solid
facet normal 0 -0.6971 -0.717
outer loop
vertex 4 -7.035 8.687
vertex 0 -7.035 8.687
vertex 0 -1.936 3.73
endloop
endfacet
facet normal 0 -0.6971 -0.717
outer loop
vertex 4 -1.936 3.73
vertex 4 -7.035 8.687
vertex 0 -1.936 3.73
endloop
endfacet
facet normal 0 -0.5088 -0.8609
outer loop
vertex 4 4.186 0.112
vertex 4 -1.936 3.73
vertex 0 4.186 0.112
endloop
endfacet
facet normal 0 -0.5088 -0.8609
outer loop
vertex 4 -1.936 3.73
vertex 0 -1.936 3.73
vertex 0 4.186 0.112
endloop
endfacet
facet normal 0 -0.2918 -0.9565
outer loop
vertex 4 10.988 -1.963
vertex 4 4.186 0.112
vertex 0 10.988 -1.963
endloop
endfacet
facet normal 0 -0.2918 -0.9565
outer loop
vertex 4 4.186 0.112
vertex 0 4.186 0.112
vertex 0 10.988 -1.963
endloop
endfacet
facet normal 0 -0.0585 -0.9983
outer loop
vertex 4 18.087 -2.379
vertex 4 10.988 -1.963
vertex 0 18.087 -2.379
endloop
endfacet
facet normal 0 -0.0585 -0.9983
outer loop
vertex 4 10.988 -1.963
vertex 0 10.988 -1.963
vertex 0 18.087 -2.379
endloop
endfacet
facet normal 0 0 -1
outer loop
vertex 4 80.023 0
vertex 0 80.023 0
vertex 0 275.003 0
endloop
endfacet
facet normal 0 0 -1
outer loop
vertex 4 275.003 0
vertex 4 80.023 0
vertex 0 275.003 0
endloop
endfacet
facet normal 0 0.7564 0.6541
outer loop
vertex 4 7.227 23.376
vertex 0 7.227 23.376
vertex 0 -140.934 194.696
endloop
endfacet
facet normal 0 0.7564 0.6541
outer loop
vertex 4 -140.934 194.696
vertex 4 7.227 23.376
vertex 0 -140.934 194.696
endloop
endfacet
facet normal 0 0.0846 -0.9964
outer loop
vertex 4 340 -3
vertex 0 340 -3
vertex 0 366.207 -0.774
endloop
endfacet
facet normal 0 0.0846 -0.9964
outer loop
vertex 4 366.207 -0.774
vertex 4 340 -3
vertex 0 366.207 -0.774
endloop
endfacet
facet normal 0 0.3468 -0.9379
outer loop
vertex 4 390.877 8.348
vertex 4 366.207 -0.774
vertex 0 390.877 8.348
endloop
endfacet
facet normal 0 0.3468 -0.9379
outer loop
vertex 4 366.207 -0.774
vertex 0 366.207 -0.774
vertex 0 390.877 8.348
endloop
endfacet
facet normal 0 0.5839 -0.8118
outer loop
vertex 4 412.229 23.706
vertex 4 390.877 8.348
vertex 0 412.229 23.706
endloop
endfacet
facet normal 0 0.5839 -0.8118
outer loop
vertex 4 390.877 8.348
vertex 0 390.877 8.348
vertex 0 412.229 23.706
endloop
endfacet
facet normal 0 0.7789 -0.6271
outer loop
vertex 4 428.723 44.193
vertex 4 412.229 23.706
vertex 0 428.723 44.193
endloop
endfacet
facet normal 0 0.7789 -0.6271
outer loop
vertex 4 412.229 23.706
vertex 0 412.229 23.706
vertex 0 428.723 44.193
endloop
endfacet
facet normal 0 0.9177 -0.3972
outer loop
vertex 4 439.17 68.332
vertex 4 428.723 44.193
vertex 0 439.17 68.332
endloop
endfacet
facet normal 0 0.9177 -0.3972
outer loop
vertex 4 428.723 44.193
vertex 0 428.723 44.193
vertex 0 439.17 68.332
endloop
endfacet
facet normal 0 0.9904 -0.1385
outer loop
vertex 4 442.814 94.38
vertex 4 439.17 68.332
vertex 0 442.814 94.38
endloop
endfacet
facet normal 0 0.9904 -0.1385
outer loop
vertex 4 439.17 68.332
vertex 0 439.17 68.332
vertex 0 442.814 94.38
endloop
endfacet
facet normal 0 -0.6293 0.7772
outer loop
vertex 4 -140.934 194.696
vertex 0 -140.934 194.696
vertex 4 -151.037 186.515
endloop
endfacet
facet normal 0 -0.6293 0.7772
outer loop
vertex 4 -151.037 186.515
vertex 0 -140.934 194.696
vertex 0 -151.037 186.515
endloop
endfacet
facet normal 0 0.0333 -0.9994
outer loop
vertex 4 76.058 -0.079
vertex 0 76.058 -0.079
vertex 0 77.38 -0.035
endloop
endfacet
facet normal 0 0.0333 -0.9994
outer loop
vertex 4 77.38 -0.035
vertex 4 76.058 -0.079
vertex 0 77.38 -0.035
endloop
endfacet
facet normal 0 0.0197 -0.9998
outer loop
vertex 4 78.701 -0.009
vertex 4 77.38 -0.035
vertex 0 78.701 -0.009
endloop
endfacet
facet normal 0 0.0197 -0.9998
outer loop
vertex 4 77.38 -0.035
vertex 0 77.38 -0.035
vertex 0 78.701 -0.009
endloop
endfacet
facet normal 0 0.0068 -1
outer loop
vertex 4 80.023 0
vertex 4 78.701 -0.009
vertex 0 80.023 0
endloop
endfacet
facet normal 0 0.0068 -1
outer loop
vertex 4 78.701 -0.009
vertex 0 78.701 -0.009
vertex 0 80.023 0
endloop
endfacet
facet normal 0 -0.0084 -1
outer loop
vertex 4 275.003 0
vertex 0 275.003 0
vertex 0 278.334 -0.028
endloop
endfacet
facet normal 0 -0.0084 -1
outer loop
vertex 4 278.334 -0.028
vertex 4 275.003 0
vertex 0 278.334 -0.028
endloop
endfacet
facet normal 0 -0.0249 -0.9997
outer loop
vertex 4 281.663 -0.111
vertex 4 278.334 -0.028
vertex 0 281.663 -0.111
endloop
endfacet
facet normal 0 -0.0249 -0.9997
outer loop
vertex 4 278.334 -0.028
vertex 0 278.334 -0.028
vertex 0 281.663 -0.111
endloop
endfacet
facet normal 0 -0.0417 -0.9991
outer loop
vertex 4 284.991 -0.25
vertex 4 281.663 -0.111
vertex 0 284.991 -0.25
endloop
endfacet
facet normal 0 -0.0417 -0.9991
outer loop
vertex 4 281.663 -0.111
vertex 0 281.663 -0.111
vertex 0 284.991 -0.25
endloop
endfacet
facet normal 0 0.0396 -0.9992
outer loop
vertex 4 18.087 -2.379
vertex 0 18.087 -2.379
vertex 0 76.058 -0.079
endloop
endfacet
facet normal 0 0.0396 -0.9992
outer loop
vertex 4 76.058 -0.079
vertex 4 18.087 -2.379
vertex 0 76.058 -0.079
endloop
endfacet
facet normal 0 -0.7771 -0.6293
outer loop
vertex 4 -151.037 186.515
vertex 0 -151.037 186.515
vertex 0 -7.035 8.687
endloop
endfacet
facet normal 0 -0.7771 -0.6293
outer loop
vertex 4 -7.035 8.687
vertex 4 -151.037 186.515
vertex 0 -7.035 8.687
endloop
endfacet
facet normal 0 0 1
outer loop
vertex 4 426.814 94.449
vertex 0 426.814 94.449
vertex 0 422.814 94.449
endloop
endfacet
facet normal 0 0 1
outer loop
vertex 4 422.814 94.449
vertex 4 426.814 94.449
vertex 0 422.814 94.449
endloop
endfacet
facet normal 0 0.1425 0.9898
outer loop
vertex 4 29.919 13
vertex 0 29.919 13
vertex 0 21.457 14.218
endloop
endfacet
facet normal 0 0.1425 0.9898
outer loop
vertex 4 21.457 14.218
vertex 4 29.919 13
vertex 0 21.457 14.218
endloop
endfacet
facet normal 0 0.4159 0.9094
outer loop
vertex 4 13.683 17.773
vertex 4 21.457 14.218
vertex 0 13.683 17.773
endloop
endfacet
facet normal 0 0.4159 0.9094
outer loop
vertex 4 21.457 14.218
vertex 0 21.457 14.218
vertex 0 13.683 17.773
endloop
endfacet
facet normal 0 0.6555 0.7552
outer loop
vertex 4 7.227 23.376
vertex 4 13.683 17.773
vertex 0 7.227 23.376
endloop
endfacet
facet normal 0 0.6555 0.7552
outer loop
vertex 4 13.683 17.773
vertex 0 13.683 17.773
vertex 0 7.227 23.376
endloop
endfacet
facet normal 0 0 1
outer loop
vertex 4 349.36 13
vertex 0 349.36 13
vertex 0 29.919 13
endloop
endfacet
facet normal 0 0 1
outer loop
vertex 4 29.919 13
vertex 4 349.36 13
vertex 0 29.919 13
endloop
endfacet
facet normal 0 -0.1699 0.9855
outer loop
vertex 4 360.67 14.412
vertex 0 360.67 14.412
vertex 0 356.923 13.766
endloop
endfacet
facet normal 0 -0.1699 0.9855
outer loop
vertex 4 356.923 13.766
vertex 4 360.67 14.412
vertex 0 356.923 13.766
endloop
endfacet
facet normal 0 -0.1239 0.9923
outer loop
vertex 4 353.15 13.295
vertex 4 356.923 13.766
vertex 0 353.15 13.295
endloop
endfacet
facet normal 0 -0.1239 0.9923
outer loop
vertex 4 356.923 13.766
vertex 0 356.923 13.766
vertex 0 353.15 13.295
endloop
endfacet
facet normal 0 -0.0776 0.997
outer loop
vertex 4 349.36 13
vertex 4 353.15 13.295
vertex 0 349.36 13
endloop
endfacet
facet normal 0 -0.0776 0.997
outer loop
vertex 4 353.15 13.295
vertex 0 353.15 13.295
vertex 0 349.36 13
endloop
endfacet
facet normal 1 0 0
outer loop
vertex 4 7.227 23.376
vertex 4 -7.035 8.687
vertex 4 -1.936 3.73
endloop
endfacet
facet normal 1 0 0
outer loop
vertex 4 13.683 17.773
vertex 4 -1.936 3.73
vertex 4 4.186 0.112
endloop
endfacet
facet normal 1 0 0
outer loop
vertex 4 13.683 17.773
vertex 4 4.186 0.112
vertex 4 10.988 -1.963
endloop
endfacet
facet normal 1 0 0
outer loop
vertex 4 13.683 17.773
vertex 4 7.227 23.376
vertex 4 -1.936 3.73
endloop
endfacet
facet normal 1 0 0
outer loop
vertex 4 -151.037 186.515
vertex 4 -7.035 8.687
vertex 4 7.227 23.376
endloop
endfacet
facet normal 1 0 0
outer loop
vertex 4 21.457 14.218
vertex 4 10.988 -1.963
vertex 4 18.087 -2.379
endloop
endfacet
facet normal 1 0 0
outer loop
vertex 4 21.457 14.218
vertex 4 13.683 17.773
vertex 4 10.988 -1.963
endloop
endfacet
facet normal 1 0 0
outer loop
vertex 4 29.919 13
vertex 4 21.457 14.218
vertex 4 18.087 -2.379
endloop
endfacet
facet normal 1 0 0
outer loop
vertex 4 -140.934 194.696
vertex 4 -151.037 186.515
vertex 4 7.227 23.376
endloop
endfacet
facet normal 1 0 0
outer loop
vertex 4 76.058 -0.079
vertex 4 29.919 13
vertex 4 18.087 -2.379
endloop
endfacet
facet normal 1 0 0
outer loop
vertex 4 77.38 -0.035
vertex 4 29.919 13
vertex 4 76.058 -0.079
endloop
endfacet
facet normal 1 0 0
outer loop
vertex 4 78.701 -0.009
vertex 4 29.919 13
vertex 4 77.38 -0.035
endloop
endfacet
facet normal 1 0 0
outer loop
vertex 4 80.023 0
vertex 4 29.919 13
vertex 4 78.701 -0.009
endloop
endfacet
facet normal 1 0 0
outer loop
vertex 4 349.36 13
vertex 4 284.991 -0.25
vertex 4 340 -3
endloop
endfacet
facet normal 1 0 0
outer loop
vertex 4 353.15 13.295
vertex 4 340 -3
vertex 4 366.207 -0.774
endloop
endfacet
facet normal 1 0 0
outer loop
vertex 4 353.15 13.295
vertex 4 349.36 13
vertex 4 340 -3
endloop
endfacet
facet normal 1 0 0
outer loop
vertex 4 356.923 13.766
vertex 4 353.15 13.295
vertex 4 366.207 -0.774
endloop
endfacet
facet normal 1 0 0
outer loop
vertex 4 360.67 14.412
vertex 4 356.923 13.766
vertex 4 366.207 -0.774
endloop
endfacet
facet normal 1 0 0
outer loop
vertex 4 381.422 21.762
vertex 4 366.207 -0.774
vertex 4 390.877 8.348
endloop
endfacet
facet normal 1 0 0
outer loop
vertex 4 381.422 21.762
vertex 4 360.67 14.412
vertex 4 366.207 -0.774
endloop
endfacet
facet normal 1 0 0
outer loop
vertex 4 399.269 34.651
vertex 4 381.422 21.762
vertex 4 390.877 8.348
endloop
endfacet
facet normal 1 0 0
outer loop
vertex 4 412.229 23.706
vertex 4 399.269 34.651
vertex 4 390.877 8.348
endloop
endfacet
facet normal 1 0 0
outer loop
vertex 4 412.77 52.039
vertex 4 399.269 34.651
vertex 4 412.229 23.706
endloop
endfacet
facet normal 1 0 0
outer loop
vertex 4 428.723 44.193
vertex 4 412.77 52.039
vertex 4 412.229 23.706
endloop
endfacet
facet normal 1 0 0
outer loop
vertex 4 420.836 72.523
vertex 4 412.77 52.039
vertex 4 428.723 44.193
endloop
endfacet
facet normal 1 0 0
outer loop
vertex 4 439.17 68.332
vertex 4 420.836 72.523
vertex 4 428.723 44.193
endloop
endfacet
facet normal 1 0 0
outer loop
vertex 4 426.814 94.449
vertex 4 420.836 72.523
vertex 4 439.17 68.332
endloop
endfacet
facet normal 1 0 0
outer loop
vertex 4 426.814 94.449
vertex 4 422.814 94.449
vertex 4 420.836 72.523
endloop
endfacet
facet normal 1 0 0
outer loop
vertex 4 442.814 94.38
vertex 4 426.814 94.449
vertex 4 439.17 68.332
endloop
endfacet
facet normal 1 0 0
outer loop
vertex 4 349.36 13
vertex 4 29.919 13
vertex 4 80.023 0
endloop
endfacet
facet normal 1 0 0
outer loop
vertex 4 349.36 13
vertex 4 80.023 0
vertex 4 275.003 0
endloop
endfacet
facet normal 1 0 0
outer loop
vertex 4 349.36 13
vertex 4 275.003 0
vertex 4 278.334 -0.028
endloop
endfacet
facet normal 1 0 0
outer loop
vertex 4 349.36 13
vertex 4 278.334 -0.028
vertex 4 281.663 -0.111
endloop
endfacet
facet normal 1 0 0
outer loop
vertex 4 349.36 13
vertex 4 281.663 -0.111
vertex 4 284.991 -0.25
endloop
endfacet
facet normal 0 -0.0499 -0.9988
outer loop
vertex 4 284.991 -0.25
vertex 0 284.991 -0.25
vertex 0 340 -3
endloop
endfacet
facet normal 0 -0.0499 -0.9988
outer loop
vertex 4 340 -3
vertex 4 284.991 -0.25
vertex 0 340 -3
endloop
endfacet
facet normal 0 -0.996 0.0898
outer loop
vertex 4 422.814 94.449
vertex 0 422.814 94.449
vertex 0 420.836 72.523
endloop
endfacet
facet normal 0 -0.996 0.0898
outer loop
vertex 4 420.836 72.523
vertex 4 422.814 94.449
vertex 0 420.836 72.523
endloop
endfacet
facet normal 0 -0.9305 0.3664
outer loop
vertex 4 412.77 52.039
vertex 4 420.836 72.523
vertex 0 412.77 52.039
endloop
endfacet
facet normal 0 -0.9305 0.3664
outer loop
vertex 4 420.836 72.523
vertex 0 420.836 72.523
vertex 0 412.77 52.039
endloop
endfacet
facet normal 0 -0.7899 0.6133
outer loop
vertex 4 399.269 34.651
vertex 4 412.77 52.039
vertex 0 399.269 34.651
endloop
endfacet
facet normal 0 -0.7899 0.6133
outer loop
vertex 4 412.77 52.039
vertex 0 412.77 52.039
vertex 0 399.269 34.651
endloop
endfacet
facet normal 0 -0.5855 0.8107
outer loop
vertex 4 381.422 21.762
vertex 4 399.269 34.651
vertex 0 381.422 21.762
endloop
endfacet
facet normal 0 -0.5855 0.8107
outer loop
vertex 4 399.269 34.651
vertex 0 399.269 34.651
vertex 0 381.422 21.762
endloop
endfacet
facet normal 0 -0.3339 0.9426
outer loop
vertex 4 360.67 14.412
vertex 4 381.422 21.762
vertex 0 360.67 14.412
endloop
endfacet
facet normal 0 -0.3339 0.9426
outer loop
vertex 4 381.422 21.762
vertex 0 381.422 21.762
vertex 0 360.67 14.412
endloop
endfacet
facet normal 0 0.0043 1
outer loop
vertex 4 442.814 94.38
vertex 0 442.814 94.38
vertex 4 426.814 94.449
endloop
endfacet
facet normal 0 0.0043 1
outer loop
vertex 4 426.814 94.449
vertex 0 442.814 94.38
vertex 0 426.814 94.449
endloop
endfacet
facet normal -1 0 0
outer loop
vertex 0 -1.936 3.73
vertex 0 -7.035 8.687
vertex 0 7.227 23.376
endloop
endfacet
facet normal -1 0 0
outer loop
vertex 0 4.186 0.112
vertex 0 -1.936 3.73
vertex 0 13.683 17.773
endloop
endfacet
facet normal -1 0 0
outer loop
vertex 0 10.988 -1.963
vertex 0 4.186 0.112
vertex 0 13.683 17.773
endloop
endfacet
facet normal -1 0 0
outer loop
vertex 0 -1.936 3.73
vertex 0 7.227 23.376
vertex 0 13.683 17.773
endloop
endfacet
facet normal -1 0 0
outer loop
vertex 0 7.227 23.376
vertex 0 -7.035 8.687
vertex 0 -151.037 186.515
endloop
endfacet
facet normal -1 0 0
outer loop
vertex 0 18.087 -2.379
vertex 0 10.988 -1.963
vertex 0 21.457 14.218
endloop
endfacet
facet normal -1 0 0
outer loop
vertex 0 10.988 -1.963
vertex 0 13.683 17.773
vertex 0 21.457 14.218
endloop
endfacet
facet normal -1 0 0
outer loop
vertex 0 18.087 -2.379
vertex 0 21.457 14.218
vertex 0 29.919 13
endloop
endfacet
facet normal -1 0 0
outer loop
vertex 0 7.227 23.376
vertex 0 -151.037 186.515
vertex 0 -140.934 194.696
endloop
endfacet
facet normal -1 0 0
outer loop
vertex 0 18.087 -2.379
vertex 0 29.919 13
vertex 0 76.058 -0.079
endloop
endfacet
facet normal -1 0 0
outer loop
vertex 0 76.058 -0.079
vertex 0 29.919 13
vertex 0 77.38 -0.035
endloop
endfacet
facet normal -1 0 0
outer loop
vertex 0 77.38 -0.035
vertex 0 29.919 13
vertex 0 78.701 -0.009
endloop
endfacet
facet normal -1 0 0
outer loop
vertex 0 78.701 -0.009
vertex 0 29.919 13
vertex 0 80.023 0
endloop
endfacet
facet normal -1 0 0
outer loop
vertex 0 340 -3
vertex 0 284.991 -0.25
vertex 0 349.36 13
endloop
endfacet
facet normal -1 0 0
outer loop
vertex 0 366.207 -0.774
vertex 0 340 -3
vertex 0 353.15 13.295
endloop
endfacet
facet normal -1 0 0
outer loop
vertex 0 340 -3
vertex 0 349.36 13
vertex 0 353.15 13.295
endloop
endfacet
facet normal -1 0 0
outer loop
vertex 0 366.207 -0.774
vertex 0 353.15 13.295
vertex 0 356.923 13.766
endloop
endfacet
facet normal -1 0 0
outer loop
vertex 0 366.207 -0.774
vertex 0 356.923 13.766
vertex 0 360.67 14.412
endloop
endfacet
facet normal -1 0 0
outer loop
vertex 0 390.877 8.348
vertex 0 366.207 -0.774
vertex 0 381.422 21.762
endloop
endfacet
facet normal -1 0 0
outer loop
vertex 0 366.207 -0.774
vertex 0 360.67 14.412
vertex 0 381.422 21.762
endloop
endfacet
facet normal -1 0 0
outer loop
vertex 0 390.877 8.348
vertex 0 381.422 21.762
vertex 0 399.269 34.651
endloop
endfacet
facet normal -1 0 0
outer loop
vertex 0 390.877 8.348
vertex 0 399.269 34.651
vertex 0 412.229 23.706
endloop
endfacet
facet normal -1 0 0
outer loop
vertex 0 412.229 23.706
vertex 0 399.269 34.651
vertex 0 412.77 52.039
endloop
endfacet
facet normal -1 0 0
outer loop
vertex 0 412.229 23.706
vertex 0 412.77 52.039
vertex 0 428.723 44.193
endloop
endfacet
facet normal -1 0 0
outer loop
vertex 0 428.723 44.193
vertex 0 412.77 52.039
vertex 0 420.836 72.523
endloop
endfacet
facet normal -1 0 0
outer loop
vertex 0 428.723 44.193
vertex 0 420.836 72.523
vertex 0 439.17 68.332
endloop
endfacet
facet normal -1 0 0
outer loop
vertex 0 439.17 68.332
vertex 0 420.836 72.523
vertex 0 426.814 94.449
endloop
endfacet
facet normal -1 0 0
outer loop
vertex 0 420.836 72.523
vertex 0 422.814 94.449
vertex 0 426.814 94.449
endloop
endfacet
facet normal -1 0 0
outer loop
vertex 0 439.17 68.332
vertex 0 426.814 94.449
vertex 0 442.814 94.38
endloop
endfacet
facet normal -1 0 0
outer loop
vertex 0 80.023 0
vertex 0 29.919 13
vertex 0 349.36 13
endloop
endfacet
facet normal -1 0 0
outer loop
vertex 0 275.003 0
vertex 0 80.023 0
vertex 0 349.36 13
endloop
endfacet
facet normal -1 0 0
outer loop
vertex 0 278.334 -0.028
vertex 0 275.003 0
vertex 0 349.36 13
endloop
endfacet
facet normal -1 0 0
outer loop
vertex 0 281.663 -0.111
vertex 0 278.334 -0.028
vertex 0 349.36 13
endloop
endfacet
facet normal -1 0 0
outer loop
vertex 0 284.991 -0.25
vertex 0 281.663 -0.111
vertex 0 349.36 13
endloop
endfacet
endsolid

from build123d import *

# Parameters (mm, degrees)
F1_DEPTH = 4


# Not quite as in the source:
# - a feature names something its author has since deleted; it is built from what else it names


with BuildPart() as f1:
    # F0 (on Right) → F1 (new body)
    with BuildSketch(Plane.YZ):
        with BuildLine():
            Line((-151.036893852, 186.5150307497), (-7.0347090015, 8.6871421429))
            ThreePointArc((-7.0347090015, 8.6871421429), (4.1862889829, 0.1122435093), (18.0871758973, -2.3787453176))
            Line((18.0871758973, -2.3787453176), (76.0584955576, -0.0786202013))
            ThreePointArc((76.0584955576, -0.0786202013), (78.0403935877, -0.0196569823), (80.023071087, 0))
            Line((80.023071087, 0), (275.0031210998, 0))
            ThreePointArc((275.0031210998, 0), (279.998441154, -0.0623927883), (284.9906444886, -0.2495322244))
            Line((284.9906444886, -0.2495322244), (340, -3))
            ThreePointArc((340, -3), (412.2291799256, 23.705892636), (442.8144690376, 94.379786148))
            Line((442.8144690376, 94.379786148), (426.8144690376, 94.448943804))
            Line((426.8144690376, 94.448943804), (422.8144690376, 94.448943804))
            ThreePointArc((422.8144690376, 94.448943804), (406.6400435708, 42.8631388402), (360.6700266042, 14.4120430259))
            ThreePointArc((360.6700266042, 14.4120430259), (355.0395932087, 13.5090940512), (349.3599875605, 13))
            Line((349.3599875605, 13), (29.918677403, 13))
            ThreePointArc((29.918677403, 13), (17.4430940609, 15.7170415777), (7.2272892953, 23.3760119817))
            Line((7.2272892953, 23.3760119817), (-140.933996353, 194.6961958333))
            Line((-140.933996353, 194.6961958333), (-151.036893852, 186.5150307497))
        make_face()
    extrude(amount=F1_DEPTH)


solid = f1.part
